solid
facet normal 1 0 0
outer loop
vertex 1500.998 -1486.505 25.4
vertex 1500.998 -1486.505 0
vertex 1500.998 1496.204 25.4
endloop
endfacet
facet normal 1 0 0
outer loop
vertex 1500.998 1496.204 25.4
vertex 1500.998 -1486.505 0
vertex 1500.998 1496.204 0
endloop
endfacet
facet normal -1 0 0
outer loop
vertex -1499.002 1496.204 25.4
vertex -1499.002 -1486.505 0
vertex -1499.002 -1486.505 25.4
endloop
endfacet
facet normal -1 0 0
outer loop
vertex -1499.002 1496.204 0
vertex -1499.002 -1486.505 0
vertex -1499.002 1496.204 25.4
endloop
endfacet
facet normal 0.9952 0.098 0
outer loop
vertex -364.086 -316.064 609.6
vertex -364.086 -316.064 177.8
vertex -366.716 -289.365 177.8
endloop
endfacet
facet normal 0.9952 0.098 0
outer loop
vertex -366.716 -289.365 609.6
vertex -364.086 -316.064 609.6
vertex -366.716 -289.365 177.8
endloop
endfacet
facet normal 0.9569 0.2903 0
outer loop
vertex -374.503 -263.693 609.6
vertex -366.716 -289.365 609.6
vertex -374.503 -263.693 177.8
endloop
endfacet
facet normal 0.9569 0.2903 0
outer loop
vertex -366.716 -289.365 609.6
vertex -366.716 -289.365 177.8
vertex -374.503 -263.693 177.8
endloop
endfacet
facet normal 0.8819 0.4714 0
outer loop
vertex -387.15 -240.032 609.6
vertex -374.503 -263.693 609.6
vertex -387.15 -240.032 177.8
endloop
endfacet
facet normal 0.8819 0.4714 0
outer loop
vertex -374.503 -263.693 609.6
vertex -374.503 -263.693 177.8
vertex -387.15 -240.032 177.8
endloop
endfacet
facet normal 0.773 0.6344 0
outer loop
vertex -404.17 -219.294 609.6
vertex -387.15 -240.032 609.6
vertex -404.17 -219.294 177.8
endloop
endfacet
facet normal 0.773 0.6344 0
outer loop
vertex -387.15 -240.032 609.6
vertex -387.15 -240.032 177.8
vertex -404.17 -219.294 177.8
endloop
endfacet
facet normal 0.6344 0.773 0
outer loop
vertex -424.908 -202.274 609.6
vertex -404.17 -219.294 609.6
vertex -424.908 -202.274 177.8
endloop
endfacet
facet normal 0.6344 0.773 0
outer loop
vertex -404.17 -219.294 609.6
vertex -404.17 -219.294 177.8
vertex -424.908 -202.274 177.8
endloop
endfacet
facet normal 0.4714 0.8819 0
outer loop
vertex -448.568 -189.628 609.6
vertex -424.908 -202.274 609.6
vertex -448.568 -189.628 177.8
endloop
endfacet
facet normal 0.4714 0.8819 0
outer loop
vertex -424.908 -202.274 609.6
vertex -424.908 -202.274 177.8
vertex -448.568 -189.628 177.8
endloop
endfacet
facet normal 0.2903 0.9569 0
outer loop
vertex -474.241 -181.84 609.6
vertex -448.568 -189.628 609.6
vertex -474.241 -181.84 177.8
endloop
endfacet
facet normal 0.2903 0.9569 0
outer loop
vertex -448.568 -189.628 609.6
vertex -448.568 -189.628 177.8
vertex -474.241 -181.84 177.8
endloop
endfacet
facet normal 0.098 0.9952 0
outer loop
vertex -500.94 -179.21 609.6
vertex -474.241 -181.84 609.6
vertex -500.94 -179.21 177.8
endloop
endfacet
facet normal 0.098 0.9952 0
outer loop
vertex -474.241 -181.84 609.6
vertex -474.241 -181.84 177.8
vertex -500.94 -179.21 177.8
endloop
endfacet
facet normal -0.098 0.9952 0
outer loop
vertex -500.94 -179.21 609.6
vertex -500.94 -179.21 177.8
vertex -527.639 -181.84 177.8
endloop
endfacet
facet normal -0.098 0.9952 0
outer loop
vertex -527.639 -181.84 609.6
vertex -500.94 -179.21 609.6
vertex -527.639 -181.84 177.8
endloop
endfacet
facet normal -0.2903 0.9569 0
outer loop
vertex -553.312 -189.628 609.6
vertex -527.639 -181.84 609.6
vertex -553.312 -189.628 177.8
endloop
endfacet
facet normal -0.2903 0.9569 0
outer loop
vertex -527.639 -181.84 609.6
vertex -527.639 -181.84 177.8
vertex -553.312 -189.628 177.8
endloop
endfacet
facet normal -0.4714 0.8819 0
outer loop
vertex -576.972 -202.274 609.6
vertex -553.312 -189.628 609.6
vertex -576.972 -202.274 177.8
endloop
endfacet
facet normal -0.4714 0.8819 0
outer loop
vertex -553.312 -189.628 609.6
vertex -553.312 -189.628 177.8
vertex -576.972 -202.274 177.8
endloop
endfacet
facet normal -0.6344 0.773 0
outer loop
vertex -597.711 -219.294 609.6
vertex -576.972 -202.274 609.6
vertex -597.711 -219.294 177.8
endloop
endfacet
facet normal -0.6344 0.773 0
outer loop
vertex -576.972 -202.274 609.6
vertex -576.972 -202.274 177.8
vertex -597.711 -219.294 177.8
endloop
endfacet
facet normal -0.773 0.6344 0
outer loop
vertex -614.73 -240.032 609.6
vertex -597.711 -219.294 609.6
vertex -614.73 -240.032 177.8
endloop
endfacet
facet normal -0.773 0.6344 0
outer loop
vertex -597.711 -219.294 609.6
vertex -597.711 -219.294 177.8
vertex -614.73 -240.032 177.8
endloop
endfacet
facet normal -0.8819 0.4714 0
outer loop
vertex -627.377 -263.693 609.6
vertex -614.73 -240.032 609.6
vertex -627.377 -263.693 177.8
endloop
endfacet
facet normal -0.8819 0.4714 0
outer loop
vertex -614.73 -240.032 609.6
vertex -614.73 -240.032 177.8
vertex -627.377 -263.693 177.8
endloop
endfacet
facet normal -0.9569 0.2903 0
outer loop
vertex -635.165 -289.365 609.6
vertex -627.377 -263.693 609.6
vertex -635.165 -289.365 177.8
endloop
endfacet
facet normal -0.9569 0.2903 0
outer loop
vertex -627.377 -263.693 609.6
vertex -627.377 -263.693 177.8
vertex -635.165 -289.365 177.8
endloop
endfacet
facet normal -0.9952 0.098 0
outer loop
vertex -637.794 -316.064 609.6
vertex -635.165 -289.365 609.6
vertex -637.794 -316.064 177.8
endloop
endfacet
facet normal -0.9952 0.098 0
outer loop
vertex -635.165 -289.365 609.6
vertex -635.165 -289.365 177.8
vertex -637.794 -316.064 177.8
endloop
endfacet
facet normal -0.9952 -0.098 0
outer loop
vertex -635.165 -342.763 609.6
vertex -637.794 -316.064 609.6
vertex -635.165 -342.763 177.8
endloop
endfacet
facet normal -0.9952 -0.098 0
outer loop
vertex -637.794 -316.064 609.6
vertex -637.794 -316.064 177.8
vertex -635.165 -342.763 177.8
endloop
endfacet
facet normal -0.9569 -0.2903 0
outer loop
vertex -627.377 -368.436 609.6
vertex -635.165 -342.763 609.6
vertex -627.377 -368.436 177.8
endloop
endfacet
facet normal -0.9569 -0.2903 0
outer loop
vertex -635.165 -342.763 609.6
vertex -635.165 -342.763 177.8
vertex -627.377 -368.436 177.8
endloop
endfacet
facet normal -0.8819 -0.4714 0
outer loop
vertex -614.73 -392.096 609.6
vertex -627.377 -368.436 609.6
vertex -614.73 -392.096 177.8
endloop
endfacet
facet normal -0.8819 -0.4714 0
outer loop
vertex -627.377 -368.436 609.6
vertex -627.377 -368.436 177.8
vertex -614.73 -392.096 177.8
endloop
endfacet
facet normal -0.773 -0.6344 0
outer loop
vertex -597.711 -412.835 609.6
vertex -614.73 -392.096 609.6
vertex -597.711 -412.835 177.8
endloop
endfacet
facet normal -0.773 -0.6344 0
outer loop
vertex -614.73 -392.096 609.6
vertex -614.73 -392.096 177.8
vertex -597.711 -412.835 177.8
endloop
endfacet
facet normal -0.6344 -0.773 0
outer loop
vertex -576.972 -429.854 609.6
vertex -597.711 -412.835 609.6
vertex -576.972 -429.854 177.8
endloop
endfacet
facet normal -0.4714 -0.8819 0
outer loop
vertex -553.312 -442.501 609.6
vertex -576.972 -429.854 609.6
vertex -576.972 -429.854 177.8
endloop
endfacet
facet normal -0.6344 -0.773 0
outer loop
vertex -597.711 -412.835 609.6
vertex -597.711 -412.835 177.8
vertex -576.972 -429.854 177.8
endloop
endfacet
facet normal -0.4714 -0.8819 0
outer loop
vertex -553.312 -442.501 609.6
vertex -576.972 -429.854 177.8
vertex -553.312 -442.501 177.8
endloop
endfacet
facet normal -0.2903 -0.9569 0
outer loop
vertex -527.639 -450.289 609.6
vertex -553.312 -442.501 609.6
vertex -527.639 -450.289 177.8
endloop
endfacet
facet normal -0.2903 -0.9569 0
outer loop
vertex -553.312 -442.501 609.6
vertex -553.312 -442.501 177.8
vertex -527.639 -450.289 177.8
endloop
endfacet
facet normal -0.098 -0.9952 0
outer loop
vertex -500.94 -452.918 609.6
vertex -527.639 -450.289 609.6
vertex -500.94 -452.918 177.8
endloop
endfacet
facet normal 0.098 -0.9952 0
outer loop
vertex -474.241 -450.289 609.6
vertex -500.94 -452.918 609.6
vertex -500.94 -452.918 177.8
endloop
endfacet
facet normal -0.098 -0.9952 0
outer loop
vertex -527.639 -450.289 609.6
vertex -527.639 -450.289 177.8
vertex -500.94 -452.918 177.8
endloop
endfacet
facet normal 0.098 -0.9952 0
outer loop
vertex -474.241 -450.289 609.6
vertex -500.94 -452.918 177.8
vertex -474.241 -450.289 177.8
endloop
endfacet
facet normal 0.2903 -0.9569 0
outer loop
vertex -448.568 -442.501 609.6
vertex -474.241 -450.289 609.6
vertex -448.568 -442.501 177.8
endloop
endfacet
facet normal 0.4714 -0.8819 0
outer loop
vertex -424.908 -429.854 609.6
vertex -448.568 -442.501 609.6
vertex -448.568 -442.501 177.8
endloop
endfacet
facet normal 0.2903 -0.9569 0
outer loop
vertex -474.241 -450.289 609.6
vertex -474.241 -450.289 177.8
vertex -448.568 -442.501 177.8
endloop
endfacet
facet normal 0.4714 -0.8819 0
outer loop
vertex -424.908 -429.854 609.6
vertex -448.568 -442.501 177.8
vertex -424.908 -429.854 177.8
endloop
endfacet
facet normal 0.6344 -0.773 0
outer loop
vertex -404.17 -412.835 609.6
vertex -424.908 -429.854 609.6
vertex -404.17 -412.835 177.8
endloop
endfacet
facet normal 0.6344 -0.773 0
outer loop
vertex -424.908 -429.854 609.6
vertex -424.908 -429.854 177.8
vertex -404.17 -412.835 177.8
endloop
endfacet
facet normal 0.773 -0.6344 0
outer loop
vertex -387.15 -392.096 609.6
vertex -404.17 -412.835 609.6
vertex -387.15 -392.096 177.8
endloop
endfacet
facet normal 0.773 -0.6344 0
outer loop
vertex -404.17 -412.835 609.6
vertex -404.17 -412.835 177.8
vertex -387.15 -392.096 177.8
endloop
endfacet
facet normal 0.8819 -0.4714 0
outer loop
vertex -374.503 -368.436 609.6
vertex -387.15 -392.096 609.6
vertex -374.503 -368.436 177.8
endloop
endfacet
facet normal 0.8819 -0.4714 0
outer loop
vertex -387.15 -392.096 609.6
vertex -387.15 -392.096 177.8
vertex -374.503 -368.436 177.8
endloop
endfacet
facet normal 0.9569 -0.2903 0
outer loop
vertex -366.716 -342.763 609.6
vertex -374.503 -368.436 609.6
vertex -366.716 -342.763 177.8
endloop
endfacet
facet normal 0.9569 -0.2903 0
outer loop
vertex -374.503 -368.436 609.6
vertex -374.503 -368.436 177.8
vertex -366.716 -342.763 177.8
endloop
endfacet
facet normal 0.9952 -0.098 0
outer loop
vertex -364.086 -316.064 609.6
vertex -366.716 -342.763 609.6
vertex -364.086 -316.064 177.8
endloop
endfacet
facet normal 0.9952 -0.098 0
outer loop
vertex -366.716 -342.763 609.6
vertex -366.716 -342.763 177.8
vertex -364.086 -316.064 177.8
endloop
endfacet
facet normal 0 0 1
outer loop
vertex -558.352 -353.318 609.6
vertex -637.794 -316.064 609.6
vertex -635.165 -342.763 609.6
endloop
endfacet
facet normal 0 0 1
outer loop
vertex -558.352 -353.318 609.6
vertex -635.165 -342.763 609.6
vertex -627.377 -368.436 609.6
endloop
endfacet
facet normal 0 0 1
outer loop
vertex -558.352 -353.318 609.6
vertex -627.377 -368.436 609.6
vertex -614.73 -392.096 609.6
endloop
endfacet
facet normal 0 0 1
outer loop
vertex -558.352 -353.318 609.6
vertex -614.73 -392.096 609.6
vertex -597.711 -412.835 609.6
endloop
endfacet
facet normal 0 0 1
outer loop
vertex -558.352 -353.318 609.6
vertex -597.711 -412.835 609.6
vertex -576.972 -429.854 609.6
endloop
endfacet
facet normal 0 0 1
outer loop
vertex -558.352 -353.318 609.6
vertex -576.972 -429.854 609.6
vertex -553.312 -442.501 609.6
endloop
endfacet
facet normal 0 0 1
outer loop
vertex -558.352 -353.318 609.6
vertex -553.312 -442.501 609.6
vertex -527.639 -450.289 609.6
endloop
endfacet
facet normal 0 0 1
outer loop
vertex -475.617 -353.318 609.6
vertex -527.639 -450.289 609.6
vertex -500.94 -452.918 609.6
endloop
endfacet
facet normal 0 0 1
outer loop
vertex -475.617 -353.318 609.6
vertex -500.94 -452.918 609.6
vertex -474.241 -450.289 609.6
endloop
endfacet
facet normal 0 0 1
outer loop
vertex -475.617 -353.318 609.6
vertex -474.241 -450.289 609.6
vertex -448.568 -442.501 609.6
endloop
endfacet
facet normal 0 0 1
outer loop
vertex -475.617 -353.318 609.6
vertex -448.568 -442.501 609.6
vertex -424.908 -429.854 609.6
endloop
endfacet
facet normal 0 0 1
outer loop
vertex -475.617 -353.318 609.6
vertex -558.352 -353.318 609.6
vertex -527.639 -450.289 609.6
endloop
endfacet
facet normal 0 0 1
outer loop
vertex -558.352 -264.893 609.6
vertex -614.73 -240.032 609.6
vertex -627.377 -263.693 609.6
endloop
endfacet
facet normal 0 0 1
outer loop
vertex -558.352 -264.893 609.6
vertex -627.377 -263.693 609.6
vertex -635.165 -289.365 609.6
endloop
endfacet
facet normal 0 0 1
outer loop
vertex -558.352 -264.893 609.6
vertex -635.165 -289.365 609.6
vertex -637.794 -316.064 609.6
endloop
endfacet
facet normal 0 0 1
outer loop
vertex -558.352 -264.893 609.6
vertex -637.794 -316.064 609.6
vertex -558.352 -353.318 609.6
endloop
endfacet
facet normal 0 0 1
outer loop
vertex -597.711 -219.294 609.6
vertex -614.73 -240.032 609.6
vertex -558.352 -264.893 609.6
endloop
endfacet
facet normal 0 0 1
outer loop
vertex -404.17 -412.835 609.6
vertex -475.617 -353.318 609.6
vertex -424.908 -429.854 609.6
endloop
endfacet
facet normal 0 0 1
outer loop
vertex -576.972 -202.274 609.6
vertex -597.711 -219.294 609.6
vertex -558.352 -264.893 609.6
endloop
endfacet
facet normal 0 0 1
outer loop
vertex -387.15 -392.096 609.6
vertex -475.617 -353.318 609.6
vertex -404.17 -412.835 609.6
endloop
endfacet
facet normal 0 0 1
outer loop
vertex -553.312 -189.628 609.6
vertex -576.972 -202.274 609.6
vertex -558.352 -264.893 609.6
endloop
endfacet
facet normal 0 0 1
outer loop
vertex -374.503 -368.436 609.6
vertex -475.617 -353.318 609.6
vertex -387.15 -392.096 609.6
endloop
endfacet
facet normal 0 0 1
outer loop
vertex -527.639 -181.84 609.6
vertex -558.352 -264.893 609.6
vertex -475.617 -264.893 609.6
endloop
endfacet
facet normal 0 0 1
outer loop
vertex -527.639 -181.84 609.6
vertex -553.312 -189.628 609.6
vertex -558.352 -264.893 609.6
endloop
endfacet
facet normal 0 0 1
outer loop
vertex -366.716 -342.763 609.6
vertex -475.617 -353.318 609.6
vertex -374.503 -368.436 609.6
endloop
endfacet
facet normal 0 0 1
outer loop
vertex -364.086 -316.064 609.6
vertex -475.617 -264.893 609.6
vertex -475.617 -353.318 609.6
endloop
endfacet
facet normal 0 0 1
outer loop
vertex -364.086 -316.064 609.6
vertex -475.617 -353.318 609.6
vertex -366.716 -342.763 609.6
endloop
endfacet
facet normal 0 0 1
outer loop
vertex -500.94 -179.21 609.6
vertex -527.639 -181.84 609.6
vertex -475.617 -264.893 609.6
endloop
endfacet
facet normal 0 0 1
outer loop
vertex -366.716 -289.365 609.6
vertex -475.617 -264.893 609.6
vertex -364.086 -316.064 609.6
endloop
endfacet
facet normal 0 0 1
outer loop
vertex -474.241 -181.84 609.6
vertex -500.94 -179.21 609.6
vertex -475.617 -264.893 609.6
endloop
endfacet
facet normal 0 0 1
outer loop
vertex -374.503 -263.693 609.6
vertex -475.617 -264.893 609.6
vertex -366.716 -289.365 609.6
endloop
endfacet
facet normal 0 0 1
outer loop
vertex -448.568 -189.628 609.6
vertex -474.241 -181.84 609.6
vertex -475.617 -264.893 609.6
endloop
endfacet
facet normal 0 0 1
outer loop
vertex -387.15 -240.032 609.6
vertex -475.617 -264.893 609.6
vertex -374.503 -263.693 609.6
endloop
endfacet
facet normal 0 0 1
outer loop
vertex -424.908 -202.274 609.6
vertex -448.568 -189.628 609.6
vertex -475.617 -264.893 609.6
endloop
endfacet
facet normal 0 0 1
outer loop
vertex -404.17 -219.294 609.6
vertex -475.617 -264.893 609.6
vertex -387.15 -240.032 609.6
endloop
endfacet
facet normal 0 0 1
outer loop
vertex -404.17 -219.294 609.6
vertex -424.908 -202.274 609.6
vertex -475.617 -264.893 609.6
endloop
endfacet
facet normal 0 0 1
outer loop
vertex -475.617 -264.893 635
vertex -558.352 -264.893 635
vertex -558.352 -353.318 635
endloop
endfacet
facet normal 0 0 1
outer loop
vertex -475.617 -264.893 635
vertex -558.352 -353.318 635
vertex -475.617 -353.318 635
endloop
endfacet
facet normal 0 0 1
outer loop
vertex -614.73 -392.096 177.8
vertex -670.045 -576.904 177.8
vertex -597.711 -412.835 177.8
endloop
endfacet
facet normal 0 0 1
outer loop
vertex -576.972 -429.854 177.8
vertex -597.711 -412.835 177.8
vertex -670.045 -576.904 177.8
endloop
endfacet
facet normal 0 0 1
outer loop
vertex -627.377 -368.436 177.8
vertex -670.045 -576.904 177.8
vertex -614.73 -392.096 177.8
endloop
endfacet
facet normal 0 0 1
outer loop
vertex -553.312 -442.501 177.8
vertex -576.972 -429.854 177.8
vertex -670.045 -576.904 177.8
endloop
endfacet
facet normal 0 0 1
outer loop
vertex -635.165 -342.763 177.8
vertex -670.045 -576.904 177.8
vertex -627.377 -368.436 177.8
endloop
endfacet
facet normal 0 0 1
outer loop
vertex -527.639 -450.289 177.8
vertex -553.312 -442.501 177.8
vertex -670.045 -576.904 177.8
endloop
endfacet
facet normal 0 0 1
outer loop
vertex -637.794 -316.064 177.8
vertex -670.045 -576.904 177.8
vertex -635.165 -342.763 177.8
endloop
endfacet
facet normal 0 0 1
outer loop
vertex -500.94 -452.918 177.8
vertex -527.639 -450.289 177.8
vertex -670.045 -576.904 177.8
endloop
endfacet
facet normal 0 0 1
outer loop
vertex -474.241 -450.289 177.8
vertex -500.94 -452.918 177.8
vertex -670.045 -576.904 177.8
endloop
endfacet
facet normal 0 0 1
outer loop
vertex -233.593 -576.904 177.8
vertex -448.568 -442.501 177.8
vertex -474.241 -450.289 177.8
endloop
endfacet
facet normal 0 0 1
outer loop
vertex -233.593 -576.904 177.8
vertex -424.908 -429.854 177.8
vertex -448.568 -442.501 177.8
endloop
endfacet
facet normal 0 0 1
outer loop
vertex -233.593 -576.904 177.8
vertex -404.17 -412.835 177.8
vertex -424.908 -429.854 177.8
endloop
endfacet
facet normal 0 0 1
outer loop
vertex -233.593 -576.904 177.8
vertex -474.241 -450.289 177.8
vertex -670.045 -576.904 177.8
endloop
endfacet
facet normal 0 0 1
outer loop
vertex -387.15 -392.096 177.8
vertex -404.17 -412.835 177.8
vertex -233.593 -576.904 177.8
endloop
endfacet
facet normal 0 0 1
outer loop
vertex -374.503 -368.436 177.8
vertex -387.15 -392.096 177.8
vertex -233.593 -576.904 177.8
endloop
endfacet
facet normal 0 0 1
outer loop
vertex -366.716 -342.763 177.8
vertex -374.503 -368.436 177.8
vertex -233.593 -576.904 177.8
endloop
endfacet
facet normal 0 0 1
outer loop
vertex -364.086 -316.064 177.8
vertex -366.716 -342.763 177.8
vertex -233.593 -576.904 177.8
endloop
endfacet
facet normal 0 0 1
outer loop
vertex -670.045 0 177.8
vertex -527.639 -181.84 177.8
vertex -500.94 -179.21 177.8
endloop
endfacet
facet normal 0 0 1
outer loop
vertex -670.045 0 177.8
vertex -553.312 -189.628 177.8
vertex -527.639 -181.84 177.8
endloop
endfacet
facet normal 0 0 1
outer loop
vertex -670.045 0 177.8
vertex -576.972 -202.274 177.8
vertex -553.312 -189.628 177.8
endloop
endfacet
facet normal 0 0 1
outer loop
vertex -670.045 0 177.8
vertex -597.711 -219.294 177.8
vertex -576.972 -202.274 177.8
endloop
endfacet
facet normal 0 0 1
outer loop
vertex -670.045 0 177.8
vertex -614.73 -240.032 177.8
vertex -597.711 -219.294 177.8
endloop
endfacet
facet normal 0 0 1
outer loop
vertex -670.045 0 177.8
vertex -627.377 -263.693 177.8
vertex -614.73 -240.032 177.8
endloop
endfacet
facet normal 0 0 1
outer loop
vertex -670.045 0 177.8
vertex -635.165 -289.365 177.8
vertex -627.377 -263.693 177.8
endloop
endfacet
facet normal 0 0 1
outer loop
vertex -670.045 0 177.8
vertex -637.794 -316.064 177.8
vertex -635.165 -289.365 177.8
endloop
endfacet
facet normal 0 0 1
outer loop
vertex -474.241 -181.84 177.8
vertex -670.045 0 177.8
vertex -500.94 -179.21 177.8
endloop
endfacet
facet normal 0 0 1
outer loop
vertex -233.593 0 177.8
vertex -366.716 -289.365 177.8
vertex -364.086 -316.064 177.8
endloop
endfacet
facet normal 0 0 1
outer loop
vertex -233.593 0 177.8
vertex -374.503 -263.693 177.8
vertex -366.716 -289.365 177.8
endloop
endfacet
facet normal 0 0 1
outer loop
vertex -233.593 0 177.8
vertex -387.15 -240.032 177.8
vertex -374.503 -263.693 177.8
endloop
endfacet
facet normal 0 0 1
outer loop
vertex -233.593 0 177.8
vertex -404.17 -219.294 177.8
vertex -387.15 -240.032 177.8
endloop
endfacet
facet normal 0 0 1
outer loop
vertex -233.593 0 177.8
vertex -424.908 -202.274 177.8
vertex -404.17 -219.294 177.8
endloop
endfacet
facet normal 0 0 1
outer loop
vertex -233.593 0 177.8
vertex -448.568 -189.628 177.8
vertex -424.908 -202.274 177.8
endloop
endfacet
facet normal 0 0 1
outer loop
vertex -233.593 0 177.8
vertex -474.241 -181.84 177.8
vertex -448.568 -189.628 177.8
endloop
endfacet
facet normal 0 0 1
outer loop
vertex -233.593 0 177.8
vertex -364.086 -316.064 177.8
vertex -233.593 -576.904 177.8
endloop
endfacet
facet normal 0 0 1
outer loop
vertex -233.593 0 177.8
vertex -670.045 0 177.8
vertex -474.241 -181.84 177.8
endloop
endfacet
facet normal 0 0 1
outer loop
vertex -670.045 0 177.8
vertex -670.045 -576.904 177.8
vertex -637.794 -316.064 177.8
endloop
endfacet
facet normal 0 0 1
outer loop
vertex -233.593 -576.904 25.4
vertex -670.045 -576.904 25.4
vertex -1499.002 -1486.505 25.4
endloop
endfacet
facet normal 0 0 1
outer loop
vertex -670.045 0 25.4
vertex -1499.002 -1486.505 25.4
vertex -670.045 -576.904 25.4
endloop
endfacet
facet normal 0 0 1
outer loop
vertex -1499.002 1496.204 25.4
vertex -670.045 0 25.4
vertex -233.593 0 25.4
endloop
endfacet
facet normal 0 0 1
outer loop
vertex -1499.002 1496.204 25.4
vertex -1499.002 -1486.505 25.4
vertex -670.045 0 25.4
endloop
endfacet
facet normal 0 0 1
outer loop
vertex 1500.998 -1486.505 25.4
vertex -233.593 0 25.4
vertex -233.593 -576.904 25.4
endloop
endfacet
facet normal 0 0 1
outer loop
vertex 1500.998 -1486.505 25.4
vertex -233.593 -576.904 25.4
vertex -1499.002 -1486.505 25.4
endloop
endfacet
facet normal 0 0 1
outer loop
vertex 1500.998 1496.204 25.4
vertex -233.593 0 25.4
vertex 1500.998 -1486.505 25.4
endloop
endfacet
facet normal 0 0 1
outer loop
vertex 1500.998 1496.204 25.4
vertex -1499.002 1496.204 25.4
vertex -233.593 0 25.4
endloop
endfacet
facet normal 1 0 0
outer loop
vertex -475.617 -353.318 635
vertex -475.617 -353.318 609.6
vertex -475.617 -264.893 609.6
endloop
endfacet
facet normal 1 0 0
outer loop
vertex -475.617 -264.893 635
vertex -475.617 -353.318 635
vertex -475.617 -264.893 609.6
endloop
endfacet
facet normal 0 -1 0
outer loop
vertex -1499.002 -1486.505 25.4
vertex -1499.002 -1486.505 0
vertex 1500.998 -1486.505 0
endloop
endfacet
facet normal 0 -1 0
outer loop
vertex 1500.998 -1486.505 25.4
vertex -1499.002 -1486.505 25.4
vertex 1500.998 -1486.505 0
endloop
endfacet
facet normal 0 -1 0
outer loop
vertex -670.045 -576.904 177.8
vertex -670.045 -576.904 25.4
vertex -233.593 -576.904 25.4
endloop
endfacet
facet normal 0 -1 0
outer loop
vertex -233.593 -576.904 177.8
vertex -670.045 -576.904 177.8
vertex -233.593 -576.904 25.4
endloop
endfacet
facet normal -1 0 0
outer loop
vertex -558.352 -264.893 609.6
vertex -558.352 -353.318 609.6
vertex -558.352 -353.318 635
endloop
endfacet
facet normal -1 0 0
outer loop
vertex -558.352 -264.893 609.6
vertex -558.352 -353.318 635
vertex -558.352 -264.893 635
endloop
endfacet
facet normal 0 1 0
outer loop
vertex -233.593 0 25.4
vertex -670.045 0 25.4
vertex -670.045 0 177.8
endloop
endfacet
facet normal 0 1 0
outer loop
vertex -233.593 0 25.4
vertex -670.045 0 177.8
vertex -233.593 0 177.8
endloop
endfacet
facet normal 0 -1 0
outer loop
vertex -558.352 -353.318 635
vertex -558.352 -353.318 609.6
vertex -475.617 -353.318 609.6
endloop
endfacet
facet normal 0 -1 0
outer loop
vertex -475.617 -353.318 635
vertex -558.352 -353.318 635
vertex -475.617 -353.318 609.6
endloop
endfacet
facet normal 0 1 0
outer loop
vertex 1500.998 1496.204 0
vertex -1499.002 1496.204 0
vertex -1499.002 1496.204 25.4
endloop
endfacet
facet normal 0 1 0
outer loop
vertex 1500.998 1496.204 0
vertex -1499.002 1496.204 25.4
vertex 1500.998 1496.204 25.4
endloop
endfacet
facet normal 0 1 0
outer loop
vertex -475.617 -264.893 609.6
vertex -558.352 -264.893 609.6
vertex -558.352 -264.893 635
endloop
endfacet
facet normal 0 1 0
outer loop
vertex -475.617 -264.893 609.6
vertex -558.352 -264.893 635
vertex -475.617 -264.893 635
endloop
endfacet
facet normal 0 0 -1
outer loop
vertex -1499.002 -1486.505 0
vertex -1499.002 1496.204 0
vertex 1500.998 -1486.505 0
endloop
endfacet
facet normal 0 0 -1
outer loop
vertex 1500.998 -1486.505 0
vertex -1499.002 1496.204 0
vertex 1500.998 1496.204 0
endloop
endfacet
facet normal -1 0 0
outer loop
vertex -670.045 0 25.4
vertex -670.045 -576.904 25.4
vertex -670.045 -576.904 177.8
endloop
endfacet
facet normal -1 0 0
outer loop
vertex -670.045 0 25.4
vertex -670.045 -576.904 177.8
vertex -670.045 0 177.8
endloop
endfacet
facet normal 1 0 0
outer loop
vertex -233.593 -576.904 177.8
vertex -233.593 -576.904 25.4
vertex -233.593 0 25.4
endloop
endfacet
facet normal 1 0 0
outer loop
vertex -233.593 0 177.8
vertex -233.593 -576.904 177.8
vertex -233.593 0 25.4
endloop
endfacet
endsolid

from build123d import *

# Parameters (mm, degrees)
F0_W     = 3000
F0_H     = 2982.708979
F1_DEPTH = 25.4
F2_W     = 436.452597
F2_H     = 576.903641
F3_DEPTH = 152.4
F4_R     = 136.854123
F5_DEPTH = 431.8
F6_W     = 82.734584
F6_H     = 88.424623
F7_DEPTH = 25.4


with BuildPart() as f1:
    # F0 (on Top) → F1 (new body)
    with BuildSketch(Plane.XY):
        with Locations((0.998342, 4.849091)):
            Rectangle(F0_W, F0_H)
    extrude(amount=F1_DEPTH)

    # F2 (on face) → F3 (join)
    with BuildSketch(Plane.XY.offset(25.4)):
        with Locations((-451.818898, -288.45182)):
            Rectangle(F2_W, F2_H)
    extrude(amount=F3_DEPTH)

    # F4 (on face) → F5 (join)
    with BuildSketch(Plane.XY.offset(177.8)):
        with Locations((-500.940084, -316.064328)):
            Circle(F4_R)
    extrude(amount=F5_DEPTH)

    # F6 (on face) → F7 (join)
    with BuildSketch(Plane.XY.offset(609.6)):
        with Locations((-516.984284, -309.105575)):
            Rectangle(F6_W, F6_H)
    extrude(amount=F7_DEPTH)


solid = f1.part
